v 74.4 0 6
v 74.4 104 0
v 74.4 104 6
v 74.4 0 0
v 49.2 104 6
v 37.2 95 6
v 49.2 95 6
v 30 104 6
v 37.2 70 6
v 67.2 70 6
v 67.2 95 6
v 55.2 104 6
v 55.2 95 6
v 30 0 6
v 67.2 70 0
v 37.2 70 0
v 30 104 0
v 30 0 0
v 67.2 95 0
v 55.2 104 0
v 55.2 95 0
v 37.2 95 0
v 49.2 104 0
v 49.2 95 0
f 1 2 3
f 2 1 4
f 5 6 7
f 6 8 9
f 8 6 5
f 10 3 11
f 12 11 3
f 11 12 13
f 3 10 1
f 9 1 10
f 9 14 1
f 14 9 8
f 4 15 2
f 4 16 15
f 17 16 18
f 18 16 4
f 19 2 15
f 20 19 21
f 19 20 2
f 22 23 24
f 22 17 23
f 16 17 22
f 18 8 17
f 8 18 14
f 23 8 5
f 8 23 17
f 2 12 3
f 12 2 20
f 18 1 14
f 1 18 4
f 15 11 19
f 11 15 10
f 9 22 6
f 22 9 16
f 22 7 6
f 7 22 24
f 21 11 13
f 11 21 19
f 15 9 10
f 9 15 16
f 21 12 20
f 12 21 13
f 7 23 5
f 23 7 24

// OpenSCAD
// Gravity battery fixture
// .4mm nozzle, .3mm layers, 3 shells, 20% rectilinear infill
// Drill out pogo pin holes with #60 - .040 bit in a pinvise
// Push in pins so wide part of pin is flush with bottom of pogo plate

Show = 0;  // True to show assembly

ContactSpacing = 3;  // Spacing of battery contacts
PinDia = 1.5;  // Pogo pin holw diameter

if (Show)
{
	doBase();
	translate([0,0,6.5])
		doSocket();
	translate([10.3,73.3,3.5])
		doPogos();
}
else
{
	translate([30,0,0])
		doBase();
//	translate([-50,0,0])
//		doSocket();
//	doPogos();
}

module doPogos()
{
	difference()
	{
		union()  // Plate to hold pogos
		{
			cube([24,10,1.5]);
			translate([4.75,7.5/2,0])
				cube([14.5,2.5,3.5]);
		}
		for(cnt = [0:4])  // Loop thru pins
			translate([(24-4*ContactSpacing)/2+ContactSpacing*cnt,5,-1])
				cylinder(h=10,d=PinDia,$fn=16);
	}
}

module doBase()
{
	difference()
	{
		cube([44.4,104,6]);  // Main base
		translate([7.2,70,-1])  // Hole for pogo plate
			cube([30,25,12]);
		translate([19.2,86,-1])  // Slot for wires
			cube([6,30,12]);
	}
}

module doSocket()
{
	union()
	{
		translate([3,3,0])
			doSocketRaw();

		cube([4,104,13.1]);
		translate([40.4,0,0])
			cube([4,104,13.1]);
		cube([44.4,3.1,13.1]);
		translate([0,101,0])
			cube([44,3,17.5]);
		cube([44.4,40,2]);
	}
}

module doSocketRaw()
{
	difference()
	{
		translate([39.4,1.3,-52])
			rotate([30,0,0])
				import("gravity_4b_top-cover_front_to-Frank_0612.stl");
		// Square it up
		translate([-12,0,0])
			cube([12,120,20]);
		translate([-10.6,-8.7,0])
			cube([50,8.7,20]);
		translate([37.5,0,0])
			cube([10,120,20]);
		translate([0,98,0])
			cube([50,10,20]);
		// Flatten bottom
		translate([0,0,-2])
			cube([50,120,2]);
		// lose the "lip"
		translate([-1,-1,12.9])
			cube([40,94,10]);
		translate([-1,93,17.5])
			cube([40,20,10]);
		// Losen up the fit
		translate([2.7,29,3.15])
			rotate([0,-1.5,0])
				cube([2,2,12]);
		translate([33.9,29,3.19])
			rotate([0,1.5,0])
				cube([2,2,12]);
		translate([2.75,76.7,1.39])
			rotate([0,-1.5,0])
				cube([2,2.5,12]);
		translate([33.85,76.7,1.43])
			rotate([0,1.5,0])
				cube([2,2.5,12]);
	}
}
